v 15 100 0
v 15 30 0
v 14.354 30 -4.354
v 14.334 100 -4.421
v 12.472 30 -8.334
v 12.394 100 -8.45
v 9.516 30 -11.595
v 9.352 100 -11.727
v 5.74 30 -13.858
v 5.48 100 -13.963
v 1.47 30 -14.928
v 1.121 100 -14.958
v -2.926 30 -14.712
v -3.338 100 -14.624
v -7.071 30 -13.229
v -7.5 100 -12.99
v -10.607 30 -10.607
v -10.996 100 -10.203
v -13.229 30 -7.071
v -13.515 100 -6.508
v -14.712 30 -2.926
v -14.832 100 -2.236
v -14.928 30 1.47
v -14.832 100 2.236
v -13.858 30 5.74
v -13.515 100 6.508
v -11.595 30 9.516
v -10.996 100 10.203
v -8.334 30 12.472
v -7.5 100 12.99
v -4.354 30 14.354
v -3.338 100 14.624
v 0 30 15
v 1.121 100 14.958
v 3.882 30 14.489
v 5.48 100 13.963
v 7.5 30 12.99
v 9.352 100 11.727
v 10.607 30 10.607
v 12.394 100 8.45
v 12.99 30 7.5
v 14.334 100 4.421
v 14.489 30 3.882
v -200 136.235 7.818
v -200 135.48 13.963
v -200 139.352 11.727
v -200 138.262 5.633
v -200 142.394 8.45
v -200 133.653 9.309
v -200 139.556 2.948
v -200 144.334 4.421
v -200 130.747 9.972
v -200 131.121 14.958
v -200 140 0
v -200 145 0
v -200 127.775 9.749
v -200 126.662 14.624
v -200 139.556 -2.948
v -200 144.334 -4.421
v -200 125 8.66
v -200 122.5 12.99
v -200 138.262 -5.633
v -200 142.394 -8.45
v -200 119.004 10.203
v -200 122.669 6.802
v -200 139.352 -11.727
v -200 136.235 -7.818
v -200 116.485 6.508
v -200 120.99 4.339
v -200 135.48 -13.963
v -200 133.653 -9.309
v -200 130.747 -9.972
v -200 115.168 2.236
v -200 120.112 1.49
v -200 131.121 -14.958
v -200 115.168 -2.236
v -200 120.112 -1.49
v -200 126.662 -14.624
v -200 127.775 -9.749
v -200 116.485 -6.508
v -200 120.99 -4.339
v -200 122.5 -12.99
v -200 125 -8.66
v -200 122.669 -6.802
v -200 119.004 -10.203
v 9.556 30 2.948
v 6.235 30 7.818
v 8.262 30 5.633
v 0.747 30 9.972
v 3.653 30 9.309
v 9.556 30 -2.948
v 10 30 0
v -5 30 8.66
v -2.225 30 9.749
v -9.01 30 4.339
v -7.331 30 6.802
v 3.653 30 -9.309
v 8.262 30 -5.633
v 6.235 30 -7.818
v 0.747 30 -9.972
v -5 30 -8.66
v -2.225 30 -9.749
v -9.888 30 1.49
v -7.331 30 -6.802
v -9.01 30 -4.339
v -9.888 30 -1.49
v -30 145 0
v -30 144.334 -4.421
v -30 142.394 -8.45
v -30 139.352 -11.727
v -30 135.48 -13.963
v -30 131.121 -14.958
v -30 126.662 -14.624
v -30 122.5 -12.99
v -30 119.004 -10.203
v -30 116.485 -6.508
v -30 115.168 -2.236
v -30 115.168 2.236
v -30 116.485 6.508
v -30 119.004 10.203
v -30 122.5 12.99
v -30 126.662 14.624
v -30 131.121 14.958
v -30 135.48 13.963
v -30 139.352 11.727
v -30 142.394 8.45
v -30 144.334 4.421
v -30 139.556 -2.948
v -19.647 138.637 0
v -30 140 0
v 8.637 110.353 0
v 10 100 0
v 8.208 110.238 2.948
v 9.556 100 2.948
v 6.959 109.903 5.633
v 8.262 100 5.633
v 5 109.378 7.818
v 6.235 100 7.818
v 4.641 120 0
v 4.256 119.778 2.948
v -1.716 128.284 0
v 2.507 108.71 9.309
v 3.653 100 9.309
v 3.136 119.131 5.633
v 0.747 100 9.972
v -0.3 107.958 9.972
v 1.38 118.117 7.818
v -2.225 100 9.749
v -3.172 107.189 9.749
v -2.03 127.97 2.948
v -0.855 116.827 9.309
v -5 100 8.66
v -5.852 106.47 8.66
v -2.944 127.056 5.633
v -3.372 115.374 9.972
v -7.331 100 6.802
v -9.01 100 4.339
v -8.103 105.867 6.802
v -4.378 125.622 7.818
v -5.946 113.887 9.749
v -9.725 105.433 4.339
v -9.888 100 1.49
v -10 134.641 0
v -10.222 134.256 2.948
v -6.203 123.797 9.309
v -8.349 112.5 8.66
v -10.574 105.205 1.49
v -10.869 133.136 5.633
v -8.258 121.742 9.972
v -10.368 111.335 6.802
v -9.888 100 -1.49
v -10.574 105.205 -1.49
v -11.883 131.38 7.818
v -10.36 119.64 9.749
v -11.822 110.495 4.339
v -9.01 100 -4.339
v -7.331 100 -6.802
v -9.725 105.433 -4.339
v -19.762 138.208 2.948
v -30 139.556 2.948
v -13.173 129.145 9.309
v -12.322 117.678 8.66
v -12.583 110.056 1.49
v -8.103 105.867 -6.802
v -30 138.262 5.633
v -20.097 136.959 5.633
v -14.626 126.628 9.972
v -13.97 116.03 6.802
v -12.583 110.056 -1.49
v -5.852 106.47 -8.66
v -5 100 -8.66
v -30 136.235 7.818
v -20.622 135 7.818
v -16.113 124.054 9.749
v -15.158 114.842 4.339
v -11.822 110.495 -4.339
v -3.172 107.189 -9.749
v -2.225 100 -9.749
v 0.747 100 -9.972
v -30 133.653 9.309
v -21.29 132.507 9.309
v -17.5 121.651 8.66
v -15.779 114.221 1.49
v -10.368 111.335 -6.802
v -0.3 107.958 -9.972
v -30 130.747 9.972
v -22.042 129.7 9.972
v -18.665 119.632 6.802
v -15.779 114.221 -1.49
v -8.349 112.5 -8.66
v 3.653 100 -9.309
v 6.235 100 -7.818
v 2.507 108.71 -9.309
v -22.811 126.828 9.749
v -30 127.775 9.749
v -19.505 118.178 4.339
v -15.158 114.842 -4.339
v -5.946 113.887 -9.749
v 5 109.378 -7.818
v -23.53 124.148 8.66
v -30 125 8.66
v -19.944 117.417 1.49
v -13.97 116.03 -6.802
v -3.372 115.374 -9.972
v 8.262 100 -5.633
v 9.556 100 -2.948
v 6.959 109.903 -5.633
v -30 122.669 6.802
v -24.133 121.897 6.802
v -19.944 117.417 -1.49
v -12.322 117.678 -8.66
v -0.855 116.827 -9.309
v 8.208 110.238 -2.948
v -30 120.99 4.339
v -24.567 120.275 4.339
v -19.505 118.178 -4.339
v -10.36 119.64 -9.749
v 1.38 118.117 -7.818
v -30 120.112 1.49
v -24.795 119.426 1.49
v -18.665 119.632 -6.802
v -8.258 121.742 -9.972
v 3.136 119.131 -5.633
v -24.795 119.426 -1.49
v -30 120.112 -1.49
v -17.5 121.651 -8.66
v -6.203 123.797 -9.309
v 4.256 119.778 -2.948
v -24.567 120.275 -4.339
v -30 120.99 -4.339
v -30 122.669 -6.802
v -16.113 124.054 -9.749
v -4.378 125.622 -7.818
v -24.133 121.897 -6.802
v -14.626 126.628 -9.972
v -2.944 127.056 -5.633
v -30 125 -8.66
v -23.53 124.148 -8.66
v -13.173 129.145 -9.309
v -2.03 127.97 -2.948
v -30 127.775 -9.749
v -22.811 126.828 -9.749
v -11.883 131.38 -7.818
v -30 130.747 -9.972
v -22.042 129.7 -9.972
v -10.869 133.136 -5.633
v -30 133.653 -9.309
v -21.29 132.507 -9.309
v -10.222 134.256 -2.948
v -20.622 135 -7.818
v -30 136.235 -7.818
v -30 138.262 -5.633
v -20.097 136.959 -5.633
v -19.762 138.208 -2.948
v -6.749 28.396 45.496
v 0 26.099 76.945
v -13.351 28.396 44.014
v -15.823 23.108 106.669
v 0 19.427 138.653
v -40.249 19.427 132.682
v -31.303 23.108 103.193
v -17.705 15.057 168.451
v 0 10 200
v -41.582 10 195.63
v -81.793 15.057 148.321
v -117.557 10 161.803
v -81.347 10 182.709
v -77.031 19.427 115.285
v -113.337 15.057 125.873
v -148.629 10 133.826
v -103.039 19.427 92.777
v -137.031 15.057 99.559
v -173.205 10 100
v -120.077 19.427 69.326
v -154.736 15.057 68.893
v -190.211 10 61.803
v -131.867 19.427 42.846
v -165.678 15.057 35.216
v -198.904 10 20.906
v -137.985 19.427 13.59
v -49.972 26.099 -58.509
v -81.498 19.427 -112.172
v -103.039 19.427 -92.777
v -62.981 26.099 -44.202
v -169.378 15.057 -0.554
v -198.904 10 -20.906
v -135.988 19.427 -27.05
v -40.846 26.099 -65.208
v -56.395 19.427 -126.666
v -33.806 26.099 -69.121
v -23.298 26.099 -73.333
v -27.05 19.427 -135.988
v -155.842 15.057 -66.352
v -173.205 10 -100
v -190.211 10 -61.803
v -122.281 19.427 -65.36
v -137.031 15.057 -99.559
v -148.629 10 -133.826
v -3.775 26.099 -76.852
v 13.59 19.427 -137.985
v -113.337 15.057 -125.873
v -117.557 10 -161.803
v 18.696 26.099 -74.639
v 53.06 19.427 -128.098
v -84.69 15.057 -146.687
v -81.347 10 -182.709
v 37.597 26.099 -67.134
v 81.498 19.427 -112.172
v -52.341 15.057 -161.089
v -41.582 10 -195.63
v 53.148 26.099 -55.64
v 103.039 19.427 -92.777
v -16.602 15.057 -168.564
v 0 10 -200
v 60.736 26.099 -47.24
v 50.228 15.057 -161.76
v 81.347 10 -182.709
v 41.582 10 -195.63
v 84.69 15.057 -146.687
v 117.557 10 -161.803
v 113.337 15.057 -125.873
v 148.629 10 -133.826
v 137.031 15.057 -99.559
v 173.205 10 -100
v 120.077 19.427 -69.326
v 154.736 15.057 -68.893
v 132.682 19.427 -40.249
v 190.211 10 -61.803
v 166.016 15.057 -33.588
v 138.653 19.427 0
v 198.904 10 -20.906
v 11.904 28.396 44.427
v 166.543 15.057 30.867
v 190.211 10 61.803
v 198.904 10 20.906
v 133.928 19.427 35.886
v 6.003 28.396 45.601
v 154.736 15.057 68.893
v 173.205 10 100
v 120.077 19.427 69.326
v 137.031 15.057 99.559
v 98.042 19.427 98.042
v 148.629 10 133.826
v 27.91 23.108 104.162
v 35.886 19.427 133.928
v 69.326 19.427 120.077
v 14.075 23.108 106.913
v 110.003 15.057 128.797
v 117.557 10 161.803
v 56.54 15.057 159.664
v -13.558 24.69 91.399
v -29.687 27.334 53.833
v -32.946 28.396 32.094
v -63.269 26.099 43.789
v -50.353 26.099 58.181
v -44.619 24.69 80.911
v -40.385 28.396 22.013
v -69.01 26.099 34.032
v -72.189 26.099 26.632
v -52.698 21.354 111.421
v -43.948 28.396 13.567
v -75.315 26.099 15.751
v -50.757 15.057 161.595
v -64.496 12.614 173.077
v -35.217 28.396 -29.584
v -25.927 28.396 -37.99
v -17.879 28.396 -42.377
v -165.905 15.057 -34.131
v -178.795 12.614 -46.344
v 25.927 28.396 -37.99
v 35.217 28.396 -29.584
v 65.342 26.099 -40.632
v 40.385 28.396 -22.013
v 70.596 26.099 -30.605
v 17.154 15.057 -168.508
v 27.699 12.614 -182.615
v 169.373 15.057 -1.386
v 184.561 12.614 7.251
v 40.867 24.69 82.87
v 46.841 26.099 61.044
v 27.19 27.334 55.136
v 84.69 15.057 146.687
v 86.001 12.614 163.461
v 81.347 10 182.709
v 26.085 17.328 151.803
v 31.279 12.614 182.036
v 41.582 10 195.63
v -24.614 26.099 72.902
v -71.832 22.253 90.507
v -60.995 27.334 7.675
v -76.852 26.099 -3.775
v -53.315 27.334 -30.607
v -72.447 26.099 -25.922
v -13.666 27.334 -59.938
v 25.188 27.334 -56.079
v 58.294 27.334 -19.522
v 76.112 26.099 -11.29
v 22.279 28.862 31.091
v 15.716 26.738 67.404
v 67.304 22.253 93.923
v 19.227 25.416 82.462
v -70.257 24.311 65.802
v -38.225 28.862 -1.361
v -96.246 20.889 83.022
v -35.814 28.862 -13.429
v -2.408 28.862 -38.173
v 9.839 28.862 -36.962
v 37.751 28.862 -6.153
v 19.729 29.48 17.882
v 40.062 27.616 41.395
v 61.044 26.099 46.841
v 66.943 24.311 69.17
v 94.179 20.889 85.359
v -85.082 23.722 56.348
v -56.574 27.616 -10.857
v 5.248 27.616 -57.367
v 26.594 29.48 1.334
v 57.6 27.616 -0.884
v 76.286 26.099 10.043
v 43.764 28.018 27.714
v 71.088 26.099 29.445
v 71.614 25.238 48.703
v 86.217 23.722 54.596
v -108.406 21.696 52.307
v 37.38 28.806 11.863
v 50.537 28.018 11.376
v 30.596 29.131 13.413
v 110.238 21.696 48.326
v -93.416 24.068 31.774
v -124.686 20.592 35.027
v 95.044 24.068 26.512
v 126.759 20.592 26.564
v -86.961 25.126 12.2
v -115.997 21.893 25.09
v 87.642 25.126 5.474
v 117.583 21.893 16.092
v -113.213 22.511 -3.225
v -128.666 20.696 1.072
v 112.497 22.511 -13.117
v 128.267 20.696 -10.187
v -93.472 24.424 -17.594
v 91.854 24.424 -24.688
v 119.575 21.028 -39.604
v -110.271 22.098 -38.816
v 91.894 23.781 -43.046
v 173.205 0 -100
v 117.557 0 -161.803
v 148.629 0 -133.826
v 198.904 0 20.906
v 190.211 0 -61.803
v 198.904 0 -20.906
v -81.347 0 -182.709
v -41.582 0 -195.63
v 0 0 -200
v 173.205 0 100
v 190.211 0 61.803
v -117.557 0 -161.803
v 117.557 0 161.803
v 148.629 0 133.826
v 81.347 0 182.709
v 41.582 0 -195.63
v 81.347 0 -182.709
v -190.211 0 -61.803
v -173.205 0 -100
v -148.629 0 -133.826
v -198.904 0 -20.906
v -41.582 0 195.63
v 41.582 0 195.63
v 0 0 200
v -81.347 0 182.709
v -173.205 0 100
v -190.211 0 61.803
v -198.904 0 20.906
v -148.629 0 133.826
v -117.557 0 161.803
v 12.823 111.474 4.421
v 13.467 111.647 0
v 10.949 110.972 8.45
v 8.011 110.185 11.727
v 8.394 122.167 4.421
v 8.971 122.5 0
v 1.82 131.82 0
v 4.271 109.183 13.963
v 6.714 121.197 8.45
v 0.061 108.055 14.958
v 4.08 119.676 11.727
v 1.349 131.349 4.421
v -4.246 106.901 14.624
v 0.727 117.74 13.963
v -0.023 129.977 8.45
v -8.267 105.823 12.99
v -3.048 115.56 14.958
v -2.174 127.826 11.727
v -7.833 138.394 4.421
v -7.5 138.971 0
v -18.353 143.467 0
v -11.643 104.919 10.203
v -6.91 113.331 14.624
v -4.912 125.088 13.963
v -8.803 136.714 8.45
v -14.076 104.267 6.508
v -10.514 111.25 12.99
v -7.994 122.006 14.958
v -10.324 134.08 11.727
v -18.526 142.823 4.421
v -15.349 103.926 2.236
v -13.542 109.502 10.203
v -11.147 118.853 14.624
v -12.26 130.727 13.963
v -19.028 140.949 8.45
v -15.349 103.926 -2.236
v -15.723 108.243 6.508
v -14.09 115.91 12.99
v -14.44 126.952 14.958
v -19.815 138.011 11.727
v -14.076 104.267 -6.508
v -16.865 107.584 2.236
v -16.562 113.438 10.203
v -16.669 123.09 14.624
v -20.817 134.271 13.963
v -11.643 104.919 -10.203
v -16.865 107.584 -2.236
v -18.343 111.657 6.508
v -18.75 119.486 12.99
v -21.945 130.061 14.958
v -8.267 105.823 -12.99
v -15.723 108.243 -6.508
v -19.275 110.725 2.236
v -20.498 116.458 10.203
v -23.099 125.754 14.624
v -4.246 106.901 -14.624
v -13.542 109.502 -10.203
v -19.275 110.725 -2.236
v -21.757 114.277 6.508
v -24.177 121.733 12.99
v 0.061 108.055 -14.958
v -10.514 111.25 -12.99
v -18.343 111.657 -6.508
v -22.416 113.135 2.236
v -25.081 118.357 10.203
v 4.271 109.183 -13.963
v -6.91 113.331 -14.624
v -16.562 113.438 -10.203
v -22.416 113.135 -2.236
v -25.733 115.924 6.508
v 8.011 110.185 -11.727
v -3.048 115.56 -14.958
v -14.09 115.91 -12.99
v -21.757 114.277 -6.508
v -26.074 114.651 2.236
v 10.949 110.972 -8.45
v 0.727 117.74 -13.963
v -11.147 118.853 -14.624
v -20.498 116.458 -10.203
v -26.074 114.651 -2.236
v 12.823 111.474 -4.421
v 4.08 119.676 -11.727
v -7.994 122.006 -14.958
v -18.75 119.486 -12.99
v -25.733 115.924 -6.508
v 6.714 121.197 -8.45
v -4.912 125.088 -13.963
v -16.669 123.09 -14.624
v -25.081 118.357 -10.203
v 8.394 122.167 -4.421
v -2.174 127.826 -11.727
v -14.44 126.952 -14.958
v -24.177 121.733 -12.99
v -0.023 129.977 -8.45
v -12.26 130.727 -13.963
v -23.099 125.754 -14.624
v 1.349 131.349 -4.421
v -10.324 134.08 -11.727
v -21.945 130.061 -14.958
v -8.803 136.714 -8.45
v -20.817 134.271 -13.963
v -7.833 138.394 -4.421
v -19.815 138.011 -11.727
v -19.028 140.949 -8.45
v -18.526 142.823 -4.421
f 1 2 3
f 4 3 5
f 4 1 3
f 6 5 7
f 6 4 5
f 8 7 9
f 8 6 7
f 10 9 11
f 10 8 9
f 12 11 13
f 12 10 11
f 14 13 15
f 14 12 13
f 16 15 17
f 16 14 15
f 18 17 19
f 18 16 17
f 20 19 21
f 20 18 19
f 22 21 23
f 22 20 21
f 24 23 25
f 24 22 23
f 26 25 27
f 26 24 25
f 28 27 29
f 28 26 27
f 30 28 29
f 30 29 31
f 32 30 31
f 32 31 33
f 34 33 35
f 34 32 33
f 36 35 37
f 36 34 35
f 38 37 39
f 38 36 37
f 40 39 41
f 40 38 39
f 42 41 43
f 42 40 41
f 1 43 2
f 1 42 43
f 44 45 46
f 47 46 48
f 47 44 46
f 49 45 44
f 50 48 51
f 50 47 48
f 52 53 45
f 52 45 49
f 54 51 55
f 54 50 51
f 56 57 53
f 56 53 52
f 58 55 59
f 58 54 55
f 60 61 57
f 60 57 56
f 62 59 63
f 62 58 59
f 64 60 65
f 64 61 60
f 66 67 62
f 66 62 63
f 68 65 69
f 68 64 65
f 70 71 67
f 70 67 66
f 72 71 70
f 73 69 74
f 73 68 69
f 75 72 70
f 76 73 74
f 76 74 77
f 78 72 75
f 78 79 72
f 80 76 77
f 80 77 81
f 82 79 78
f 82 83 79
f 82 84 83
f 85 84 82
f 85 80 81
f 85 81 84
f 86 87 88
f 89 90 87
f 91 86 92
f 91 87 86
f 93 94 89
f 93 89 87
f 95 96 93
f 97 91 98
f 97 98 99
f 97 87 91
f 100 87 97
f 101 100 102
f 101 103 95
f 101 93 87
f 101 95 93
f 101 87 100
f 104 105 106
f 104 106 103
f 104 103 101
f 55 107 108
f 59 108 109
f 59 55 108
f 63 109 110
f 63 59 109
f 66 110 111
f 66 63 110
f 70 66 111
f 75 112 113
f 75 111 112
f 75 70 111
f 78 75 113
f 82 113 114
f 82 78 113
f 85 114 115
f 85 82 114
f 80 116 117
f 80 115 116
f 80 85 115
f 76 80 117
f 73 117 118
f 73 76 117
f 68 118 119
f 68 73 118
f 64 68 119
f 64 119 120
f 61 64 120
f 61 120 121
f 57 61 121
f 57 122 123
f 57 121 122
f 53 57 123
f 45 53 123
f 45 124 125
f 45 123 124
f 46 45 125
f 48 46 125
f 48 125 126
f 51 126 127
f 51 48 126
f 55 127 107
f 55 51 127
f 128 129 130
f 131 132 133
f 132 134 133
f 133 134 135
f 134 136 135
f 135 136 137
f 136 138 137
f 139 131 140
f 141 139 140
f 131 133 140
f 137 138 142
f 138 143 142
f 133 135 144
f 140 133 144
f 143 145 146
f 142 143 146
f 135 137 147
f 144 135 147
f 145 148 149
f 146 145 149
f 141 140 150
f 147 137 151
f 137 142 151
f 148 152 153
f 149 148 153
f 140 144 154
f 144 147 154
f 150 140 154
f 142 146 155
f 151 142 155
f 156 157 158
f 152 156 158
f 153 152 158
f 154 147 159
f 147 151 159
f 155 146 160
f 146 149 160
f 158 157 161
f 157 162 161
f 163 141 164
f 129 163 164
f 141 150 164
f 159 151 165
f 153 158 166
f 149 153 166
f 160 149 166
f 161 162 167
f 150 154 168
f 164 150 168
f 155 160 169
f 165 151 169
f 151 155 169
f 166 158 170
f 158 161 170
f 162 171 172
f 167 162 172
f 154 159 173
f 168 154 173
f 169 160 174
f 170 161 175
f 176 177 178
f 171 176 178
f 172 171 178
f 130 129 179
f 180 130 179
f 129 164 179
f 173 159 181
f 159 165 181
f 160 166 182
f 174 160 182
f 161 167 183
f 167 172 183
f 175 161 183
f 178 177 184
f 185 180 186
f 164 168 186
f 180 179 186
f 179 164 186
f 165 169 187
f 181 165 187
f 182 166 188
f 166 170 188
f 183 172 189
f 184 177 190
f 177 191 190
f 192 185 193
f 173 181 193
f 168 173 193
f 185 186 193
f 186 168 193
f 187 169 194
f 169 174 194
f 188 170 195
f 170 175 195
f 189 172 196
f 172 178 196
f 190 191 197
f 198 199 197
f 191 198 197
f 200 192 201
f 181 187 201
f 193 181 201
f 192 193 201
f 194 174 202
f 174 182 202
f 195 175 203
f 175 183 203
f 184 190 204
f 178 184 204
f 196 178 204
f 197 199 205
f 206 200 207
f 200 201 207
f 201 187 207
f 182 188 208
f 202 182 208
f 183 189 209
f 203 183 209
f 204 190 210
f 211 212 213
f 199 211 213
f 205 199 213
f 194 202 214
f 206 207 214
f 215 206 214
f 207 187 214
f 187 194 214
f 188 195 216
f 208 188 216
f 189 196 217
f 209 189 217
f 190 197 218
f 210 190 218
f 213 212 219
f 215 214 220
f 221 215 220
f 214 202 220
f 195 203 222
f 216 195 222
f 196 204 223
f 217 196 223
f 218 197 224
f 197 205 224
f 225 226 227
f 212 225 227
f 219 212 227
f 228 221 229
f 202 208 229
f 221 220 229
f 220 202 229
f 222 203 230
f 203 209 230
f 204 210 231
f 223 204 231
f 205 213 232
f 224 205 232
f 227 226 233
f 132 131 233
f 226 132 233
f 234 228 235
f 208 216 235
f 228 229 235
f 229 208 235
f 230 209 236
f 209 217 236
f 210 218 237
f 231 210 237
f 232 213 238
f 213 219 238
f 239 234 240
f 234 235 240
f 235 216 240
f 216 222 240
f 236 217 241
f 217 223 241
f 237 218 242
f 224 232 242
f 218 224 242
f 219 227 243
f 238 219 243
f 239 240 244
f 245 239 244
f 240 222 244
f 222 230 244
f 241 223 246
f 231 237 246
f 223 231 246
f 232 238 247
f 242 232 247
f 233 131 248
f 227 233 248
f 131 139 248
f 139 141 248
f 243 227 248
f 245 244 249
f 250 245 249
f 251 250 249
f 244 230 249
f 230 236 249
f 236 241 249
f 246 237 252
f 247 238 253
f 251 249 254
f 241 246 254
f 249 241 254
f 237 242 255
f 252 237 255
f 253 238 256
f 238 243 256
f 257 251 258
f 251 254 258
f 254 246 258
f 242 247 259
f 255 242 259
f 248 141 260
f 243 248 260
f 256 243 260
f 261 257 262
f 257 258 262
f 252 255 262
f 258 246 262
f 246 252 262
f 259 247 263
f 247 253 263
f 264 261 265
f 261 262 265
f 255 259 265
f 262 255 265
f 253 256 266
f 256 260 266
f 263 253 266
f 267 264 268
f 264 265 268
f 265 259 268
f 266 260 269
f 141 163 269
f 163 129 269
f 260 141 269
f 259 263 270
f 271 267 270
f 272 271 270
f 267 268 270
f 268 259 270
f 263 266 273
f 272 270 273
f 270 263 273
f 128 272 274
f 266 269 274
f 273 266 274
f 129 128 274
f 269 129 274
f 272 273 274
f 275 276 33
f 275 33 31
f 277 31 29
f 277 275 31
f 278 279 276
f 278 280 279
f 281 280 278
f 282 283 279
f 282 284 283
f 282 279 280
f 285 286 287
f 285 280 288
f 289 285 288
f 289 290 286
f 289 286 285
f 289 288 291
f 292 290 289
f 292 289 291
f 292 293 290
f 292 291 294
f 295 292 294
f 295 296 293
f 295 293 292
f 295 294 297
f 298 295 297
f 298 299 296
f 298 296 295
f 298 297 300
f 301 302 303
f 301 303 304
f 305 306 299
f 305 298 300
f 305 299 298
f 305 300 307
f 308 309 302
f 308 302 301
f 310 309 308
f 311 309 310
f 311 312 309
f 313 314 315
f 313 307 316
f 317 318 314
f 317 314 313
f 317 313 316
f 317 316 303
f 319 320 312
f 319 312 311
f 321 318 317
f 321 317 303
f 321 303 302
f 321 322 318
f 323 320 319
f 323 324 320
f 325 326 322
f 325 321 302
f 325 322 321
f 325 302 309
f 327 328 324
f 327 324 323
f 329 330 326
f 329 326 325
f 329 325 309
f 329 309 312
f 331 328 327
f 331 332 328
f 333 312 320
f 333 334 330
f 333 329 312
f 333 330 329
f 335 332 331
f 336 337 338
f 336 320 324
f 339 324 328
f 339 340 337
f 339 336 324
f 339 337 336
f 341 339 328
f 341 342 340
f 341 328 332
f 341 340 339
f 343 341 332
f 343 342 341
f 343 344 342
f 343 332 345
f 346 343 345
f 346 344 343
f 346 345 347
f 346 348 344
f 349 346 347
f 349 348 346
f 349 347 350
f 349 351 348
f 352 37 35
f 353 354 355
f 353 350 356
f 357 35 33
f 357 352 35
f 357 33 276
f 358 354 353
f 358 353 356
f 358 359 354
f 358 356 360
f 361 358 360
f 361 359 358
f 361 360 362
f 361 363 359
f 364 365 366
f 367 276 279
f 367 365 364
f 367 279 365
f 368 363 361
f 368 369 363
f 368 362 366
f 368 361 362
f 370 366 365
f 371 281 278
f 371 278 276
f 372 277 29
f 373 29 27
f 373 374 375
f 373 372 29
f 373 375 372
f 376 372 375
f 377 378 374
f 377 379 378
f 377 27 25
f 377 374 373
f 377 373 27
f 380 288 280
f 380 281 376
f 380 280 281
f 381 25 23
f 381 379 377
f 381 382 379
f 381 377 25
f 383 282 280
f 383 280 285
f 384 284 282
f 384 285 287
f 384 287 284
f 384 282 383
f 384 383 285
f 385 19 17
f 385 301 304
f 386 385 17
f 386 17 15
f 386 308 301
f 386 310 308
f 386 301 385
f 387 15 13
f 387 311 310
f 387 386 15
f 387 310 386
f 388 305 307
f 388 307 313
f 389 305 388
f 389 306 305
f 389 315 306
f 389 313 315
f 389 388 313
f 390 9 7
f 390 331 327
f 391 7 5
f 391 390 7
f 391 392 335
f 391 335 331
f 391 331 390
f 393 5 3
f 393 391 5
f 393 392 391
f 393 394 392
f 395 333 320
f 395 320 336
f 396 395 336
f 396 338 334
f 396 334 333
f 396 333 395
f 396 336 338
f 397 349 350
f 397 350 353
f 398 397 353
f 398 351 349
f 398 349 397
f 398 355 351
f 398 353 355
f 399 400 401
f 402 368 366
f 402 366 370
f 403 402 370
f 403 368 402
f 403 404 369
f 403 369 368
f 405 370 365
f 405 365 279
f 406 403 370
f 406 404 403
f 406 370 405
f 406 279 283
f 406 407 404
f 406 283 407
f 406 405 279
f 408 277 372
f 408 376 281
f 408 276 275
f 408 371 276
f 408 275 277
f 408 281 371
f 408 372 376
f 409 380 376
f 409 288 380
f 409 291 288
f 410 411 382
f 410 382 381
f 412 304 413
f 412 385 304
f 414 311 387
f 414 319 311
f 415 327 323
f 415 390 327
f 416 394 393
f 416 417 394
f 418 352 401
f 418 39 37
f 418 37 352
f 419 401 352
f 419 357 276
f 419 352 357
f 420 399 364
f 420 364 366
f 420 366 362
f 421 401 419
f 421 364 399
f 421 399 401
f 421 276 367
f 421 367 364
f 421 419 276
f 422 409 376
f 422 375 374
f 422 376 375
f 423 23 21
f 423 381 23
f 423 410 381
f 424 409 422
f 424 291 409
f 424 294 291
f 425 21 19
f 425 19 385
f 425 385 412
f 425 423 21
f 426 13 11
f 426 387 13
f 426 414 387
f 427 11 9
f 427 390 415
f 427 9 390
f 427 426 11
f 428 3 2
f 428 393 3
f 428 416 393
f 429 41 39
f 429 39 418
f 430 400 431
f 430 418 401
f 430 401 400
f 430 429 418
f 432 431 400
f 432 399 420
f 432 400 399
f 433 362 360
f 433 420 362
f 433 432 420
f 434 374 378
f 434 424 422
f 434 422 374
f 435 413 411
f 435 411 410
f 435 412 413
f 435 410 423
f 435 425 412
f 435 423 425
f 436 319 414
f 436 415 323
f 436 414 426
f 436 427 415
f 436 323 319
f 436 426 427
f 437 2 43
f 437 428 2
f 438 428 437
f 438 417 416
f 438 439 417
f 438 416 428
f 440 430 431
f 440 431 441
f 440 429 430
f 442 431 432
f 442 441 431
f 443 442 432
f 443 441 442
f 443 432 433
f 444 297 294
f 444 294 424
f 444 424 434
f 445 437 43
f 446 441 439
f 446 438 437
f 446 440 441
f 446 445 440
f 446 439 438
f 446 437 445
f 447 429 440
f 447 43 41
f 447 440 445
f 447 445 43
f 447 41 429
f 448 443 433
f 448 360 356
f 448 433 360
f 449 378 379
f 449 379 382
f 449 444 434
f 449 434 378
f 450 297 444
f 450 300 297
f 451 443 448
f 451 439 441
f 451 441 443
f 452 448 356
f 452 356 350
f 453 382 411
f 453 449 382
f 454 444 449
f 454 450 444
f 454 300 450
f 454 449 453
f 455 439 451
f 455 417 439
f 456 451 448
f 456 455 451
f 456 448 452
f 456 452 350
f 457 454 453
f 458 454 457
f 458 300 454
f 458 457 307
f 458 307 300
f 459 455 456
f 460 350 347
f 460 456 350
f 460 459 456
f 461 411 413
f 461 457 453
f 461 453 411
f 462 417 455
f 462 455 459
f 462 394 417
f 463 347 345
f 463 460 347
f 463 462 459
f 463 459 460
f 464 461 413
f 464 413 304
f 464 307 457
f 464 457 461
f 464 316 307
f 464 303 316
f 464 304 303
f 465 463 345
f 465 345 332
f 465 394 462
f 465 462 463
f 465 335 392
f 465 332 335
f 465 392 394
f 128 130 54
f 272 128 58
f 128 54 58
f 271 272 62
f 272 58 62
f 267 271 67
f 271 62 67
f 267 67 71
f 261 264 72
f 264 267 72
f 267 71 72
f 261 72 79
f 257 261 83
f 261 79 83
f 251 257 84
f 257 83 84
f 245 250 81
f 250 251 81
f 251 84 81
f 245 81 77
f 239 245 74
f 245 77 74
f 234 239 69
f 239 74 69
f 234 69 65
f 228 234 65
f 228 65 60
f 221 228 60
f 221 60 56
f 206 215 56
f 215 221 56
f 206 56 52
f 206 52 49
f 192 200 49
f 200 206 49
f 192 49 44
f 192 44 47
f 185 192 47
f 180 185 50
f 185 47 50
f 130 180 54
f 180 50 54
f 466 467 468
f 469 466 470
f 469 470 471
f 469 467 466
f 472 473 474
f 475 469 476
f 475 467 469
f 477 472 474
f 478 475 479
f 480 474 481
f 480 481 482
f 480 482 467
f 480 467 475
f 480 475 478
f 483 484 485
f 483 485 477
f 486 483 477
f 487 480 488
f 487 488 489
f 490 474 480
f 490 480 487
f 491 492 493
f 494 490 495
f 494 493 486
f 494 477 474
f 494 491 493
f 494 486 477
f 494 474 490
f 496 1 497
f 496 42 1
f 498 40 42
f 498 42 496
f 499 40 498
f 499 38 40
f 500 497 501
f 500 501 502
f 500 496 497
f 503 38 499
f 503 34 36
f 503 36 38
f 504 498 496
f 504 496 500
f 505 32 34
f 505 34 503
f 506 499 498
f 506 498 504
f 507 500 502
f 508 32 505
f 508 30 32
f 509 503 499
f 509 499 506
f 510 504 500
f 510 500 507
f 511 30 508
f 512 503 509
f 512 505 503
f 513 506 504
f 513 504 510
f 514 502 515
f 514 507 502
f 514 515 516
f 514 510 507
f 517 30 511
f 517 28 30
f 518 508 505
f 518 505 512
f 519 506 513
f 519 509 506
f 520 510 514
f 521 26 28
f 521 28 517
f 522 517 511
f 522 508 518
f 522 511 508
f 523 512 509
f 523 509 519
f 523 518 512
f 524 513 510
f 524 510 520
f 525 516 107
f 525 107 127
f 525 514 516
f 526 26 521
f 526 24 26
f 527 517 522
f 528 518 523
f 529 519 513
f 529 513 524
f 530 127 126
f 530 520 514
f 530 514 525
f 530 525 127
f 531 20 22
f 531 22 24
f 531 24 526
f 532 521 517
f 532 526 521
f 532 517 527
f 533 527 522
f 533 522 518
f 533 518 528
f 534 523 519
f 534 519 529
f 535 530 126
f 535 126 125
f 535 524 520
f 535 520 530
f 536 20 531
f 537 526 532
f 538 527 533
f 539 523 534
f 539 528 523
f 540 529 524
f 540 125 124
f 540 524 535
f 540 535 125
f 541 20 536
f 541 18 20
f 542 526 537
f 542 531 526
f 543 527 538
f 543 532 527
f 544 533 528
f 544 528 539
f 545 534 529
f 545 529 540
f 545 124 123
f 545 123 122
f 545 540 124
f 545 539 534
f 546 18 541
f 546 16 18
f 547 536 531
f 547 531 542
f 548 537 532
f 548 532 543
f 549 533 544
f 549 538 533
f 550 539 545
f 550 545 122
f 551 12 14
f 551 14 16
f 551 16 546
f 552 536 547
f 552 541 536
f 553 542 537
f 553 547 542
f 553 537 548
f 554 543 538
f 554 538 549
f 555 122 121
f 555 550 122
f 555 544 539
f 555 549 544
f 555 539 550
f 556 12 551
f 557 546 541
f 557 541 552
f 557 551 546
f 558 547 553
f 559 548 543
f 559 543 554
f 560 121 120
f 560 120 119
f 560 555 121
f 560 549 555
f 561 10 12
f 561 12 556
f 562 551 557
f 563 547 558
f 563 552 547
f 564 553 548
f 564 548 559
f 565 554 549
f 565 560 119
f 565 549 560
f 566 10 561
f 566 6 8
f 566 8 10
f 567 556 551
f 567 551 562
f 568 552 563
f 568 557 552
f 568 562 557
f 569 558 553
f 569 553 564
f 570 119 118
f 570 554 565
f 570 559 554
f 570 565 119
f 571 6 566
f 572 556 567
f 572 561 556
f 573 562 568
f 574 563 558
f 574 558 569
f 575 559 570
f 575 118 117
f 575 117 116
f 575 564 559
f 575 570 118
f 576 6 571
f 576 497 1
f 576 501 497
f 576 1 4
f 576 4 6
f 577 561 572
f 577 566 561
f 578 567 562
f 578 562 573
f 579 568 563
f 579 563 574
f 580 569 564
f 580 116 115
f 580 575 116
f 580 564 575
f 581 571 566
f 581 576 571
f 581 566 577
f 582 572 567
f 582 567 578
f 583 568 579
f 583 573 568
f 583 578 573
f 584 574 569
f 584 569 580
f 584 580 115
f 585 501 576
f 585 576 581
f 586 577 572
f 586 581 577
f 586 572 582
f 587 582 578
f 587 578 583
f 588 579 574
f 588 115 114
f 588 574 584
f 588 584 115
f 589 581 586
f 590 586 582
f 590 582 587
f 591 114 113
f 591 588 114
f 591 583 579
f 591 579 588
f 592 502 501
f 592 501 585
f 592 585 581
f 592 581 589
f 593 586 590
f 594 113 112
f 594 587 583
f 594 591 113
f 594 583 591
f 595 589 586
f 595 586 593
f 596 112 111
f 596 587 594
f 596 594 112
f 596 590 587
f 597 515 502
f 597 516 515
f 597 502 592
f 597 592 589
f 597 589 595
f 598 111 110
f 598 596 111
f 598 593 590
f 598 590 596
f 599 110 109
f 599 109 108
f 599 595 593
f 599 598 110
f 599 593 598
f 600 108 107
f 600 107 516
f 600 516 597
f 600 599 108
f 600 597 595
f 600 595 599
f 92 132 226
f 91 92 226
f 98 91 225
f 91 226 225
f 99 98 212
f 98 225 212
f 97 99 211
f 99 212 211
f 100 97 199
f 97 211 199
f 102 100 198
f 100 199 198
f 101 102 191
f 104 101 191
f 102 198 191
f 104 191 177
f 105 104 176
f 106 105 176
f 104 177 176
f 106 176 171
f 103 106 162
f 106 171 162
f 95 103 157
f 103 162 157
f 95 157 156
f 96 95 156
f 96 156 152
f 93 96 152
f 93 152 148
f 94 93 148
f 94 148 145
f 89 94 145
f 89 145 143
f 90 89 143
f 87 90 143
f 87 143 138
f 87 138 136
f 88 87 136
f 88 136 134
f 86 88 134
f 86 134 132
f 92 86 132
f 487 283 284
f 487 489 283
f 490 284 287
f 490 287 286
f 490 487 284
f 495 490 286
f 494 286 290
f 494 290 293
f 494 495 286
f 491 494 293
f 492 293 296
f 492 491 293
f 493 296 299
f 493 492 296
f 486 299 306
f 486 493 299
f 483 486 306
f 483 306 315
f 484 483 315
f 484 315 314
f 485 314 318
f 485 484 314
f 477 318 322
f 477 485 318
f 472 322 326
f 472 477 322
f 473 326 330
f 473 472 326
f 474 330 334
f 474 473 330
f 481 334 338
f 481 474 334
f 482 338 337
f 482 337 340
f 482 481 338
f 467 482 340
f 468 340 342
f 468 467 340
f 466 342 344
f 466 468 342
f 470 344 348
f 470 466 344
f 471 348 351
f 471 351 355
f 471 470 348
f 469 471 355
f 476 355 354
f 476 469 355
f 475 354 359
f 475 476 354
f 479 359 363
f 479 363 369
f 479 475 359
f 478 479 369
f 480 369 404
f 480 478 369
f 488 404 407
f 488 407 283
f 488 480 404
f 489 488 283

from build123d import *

# Parameters (mm, degrees)
SKETCH2_R   = 15
SKETCH2_R_2 = 10


with BuildPart() as part:
    # Sketch1 → Revolve2 (revolve)
    with BuildSketch(Plane(origin=(0, 0, 0), x_dir=(0, 0, -1), z_dir=(1, 0, 0))):
        with BuildLine():
            Line((0, 30), (-15, 30))
            ThreePointArc((-15, 30), (-107.836049883, 23.108461417), (-200, 10))
            Line((-200, 10), (-200, 0))
            Line((-200, 0), (0, 0))
            Line((0, 0), (0, 30))
        make_face()
    revolve(axis=Axis((0, 30, 0), (0, -1, 0)))

    # Sweep1: sweep along a path in Sketch3
    with BuildLine(Plane.XY) as sweep1_path:
        Line((0, 30), (0, 100))
        ThreePointArc((0, 100), (-8.786796564, 121.213203436), (-30, 130))
        Line((-30, 130), (-200, 130))
    # Sketch2 → Sweep1 (sweep)
    with BuildSketch(Plane(origin=(0, 30, 0), x_dir=(1, 0, 0), z_dir=(0, 1, 0))):
        Circle(SKETCH2_R)
        Circle(SKETCH2_R_2, mode=Mode.SUBTRACT)
    sweep(path=sweep1_path.line)


solid = part.part
